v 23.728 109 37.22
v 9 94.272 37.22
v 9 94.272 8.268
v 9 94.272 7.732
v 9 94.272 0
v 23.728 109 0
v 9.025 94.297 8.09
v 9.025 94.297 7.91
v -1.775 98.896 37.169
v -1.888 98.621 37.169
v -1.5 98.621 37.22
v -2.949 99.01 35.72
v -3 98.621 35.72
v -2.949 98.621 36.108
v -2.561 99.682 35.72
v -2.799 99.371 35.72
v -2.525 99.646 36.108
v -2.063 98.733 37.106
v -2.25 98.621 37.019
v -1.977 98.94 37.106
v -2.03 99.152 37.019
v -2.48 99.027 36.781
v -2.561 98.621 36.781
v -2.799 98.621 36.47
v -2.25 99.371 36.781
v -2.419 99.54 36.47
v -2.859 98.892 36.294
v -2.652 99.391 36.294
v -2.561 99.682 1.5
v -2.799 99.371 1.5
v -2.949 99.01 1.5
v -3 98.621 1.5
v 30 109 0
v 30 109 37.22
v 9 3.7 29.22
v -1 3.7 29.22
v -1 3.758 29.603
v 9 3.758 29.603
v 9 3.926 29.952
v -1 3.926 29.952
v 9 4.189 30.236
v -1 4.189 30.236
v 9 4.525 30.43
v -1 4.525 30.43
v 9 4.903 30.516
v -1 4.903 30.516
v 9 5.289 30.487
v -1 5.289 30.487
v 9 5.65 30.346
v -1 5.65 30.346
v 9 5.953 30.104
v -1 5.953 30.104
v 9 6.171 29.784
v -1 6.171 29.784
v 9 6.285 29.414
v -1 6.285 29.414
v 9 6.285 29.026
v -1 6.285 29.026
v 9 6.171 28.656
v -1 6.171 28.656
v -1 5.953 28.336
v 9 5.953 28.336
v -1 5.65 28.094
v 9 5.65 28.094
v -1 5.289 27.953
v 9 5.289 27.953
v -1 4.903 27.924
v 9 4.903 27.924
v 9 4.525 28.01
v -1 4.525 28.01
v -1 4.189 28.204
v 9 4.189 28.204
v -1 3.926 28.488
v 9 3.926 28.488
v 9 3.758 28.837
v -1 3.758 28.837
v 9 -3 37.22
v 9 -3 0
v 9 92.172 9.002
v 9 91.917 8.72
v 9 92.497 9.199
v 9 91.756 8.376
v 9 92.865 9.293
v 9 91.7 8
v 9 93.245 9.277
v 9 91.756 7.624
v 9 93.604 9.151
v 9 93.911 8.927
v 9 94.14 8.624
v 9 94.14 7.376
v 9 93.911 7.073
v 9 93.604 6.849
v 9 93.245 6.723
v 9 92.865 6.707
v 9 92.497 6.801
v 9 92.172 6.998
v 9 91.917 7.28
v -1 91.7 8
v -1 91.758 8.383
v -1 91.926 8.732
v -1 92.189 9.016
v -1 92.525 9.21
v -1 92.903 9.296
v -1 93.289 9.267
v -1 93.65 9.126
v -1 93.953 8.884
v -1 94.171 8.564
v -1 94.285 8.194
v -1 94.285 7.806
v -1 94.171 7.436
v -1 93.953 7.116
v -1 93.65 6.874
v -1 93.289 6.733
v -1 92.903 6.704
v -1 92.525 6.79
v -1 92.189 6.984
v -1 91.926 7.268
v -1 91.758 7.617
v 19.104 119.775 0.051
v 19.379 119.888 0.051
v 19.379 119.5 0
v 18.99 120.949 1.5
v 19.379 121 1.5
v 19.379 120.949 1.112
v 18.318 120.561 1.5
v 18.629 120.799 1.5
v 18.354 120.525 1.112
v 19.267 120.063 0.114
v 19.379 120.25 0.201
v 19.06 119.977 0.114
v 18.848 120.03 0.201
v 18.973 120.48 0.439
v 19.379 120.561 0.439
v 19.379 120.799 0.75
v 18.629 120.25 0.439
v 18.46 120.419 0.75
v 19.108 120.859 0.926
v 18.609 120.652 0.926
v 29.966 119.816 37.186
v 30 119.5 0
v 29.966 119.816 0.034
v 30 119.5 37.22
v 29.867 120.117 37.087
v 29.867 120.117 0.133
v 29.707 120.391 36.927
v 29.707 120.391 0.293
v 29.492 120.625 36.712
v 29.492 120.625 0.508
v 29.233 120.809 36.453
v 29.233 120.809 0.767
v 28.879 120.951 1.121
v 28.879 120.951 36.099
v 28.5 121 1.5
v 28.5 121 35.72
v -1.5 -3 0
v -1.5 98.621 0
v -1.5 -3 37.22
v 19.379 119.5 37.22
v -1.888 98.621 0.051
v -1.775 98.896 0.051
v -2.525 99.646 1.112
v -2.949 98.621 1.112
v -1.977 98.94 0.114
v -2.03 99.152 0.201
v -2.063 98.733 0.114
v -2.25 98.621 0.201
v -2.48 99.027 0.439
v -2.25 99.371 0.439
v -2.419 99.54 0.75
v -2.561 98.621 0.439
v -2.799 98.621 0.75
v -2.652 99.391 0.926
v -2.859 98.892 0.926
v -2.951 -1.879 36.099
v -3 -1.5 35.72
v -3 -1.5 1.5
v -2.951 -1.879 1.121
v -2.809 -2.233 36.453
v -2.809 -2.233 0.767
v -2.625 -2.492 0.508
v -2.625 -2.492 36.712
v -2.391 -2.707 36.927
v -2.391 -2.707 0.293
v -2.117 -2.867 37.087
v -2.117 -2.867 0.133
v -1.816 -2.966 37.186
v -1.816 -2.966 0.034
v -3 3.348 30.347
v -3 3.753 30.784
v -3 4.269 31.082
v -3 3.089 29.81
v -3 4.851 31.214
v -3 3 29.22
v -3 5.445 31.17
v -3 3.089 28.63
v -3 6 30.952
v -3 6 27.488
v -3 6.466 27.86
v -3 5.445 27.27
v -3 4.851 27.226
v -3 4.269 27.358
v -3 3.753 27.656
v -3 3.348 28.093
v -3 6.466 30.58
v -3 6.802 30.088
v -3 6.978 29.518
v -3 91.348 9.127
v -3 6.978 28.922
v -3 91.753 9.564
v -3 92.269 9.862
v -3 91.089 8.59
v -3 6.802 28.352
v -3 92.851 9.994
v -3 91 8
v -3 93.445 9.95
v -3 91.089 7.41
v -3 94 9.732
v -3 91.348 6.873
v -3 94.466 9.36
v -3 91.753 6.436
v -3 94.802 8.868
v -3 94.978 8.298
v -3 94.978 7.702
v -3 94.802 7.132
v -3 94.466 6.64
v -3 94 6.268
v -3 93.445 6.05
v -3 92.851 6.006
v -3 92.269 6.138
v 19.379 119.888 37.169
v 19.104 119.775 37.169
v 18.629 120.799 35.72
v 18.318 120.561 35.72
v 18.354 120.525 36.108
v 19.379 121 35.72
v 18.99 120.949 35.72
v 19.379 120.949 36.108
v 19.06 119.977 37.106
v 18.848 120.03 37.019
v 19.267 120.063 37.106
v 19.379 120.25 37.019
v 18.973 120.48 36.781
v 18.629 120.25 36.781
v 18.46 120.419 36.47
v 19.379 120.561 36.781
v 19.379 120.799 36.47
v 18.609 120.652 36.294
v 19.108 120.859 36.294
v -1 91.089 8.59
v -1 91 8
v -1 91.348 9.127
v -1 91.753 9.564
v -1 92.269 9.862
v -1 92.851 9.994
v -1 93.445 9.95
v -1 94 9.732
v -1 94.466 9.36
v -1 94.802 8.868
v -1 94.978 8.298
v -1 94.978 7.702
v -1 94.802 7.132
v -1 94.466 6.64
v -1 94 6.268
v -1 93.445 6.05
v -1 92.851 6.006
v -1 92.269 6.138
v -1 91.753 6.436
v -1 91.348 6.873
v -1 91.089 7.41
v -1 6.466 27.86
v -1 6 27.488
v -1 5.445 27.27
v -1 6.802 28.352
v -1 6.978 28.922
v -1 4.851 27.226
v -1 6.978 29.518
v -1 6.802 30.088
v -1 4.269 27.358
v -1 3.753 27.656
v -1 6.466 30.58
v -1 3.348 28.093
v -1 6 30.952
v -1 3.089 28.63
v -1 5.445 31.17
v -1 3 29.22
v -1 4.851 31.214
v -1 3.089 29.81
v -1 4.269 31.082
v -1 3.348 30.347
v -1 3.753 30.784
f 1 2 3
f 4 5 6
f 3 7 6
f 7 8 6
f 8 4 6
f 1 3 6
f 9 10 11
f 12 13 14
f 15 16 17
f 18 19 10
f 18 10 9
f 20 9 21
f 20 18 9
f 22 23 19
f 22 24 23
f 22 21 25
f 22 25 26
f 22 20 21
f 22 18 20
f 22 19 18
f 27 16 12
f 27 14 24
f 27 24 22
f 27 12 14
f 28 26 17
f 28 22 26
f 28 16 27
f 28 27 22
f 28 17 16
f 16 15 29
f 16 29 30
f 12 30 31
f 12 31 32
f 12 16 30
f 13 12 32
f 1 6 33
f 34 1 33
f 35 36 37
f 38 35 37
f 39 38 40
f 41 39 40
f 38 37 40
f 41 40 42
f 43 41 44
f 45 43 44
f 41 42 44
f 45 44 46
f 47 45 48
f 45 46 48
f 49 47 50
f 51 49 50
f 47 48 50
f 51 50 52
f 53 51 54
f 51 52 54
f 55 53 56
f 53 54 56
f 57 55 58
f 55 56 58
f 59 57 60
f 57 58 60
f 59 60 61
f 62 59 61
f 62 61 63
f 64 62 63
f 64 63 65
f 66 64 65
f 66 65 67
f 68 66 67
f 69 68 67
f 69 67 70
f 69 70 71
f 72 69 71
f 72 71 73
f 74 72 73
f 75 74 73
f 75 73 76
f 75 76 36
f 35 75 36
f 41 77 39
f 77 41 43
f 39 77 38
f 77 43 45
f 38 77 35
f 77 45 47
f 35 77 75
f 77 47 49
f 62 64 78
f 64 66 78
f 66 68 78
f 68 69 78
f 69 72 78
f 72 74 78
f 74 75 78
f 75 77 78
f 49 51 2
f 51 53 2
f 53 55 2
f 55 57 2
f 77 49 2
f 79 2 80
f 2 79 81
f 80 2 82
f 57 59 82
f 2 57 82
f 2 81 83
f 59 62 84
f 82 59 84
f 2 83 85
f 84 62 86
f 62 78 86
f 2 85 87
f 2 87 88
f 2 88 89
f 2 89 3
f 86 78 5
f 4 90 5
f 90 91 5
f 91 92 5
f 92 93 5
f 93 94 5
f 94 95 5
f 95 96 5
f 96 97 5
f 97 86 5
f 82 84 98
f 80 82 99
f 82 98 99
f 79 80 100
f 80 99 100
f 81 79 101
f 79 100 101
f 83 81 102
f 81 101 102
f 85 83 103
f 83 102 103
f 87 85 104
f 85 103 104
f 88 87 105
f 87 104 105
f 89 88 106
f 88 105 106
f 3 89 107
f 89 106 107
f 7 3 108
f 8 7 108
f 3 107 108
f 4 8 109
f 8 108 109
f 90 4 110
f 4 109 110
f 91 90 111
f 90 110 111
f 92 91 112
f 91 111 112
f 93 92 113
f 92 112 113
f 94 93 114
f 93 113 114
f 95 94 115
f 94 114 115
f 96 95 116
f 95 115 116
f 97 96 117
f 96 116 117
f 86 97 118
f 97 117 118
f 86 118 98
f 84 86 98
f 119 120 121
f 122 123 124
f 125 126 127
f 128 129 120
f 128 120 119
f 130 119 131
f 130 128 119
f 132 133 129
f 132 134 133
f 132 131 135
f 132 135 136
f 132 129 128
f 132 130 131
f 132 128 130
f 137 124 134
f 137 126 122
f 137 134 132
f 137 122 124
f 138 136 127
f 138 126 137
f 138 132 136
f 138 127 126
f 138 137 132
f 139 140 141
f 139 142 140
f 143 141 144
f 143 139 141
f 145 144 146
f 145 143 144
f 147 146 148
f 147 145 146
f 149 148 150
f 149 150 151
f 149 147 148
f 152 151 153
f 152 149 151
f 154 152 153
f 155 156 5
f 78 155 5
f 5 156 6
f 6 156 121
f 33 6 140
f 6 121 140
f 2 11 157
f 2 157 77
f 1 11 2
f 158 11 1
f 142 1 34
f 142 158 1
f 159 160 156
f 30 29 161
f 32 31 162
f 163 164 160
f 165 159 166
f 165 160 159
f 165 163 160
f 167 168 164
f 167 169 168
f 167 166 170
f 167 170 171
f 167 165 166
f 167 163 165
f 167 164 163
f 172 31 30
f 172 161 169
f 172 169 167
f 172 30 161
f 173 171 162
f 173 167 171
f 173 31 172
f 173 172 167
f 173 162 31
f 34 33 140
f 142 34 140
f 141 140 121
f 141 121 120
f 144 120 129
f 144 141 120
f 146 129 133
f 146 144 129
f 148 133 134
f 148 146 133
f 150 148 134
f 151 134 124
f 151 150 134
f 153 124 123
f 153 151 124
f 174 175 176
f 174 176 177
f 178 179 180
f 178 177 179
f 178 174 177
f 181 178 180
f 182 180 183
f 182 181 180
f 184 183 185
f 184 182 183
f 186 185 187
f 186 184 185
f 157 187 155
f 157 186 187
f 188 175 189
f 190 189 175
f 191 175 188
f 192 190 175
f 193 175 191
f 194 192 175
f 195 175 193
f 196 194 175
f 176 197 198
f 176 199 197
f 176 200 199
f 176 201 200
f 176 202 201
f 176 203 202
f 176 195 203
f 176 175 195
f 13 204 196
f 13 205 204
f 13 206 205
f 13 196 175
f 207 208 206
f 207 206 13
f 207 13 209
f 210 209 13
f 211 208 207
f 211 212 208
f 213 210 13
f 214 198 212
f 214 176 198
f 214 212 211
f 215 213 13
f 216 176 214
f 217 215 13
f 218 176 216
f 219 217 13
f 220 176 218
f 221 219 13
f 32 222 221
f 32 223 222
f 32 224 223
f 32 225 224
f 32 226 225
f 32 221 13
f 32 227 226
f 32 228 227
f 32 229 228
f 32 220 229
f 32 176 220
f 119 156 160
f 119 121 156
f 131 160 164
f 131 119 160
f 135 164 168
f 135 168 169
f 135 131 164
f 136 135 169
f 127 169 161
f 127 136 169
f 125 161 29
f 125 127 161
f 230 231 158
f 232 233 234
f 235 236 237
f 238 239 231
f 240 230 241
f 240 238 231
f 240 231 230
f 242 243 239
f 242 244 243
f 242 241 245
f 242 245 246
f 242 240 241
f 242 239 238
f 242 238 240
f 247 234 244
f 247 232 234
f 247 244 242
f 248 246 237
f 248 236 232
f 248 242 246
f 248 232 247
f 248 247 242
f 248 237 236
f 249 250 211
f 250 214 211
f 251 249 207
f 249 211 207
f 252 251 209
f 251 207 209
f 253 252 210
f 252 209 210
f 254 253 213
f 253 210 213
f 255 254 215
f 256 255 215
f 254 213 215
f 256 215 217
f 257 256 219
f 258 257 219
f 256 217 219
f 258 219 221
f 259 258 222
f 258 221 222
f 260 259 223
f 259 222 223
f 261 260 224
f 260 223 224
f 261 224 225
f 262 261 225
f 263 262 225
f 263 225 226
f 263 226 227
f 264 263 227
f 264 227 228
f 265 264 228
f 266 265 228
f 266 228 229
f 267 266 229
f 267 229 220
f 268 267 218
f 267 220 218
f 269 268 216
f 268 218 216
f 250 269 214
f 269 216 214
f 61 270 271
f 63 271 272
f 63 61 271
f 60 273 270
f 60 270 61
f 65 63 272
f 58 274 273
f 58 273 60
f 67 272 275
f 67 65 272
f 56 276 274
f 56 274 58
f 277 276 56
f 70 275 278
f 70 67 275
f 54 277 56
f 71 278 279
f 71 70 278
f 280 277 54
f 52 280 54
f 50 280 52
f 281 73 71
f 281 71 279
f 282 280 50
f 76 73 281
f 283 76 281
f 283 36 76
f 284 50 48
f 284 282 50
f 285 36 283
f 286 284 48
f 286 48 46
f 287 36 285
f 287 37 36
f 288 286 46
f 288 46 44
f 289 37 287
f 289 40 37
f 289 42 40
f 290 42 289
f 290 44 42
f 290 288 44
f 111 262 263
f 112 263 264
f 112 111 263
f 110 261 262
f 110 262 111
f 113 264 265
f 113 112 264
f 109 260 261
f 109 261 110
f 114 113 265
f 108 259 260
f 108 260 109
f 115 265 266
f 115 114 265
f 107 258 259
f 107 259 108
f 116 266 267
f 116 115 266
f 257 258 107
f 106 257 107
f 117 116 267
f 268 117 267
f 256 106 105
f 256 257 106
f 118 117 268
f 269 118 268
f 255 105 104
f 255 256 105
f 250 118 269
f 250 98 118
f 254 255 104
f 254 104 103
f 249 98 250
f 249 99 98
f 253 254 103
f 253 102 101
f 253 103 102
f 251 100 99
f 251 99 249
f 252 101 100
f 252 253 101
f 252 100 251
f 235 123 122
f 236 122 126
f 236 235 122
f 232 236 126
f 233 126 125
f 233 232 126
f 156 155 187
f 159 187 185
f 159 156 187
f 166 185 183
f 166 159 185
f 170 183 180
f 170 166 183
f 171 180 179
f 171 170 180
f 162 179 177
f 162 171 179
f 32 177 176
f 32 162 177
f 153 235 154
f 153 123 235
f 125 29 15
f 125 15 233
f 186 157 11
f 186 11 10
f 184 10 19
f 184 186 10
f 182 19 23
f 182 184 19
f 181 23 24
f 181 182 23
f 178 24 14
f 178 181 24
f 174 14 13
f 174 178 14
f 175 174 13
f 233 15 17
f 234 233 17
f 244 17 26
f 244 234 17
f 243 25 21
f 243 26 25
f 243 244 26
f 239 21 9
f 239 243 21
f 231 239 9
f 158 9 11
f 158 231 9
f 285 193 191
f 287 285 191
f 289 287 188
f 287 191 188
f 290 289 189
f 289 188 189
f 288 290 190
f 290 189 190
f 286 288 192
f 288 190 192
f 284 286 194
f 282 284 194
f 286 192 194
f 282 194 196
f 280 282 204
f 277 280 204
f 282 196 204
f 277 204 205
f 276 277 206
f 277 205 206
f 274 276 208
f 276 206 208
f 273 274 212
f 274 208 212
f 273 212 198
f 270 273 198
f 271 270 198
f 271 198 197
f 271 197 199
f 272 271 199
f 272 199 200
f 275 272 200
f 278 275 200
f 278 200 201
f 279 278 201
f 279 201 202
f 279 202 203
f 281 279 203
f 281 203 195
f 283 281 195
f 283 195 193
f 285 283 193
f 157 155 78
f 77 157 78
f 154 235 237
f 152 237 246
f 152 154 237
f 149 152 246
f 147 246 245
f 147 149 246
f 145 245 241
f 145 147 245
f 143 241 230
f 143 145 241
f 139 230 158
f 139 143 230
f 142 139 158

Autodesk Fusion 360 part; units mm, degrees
sketch "Sketch1" plane through (0, 0, 0) normal (0, 0, 1) x (1, 0, 0)
  line L0 (0, 0) -> (0, 98) construction
  line L1 (0, 98) -> (20, 118) construction
  line L2 (20, 118) -> (30, 118) construction
  line L3 (9, 0) -> (9, 94.2721)
  line L4 (9, 94.2721) -> (23.7279, 109)
  line L5 (23.7279, 109) -> (30, 109)
  line L6 (-3, 0) -> (-3, 99.2426)
  line L7 (-3, 99.2426) -> (18.7574, 121)
  line L8 (18.7574, 121) -> (30, 121)
  line L9 (0, 0) -> (9, 0) construction
  line L10 (0, 0) -> (-3, 0) construction
  line L11 (30, 118) -> (30, 109)
  line L12 (30, 118) -> (30, 121)
  line L13 (0, -3) -> (9, -3)
  line L14 (0, -3) -> (-3, -3)
  line L15 (9, -3) -> (9, 0)
  line L16 (-3, -3) -> (-3, 0)
  dimension "d7" = 98
  dimension "d8" = 135
  dimension "d9" = 118
  dimension "d10" = 10
  dimension "d11" = 9
  dimension "d12" = -3
  dimension "d13" = 3
extrude "Extrude1" add sketch "Sketch1" along normal blind 37.22
shell "Shell1" thickness 3 removed faces 4 at (30, 119, 12.4067) at (25.8186, 109, 12.4067) at (13.9093, 99.1814, 24.8133) at (9, 31.424, 12.4067)
sketch "Sketch2" plane through (-3, 0, 0) normal (-1, 0, 0) x (0, -1, 0)
  line L0 (-99.2426, 0) -> (3, 0)
  line L1 (3, 0) -> (3, 37.22)
  line L2 (3, 37.22) -> (-99.2426, 37.22)
  line L3 (-99.2426, 37.22) -> (-99.2426, 0)
  line L4 (0, 3) -> (-98, 3) construction
  line L5 (-98, 3) -> (-98, 34.22) construction
  line L6 (-98, 34.22) -> (0, 34.22) construction
  line L7 (0, 34.22) -> (0, 3) construction
  circle A0 centre (-5, 29.22) radius 2
  circle A1 centre (-93, 8) radius 1.3
  circle A2 centre (-93, 8) radius 2
  circle A3 centre (-5, 29.22) radius 1.3
  dimension "d21" = 3
  dimension "d22" = 3
  dimension "d23" = 3
  dimension "d24" = 98
  dimension "d25" = 2.6
  dimension "d26" = 4
  dimension "d27" = 5
  dimension "d28" = 5
  dimension "d29" = 5
  dimension "d30" = 5
  dimension "d31" = 2.6
  dimension "d32" = 4
extrude "Extrude2" cut sketch "Sketch2" against normal through all contours A1 | A3
extrude "Extrude3" cut sketch "Sketch2" against normal blind 2 contours A0 | A2
fillet "Fillet3" radius 1.5 10 edges at (-3, -3, 18.61) (-3, 48.1213, 37.22) (-3, 48.1213, 0) (-3, 99.2426, 18.61) (7.8787, 110.1213, 37.22) (7.8787, 110.1213, 0) (18.7574, 121, 18.61) (24.3787, 121, 37.22) (24.3787, 121, 0) (30, 121, 18.61)
